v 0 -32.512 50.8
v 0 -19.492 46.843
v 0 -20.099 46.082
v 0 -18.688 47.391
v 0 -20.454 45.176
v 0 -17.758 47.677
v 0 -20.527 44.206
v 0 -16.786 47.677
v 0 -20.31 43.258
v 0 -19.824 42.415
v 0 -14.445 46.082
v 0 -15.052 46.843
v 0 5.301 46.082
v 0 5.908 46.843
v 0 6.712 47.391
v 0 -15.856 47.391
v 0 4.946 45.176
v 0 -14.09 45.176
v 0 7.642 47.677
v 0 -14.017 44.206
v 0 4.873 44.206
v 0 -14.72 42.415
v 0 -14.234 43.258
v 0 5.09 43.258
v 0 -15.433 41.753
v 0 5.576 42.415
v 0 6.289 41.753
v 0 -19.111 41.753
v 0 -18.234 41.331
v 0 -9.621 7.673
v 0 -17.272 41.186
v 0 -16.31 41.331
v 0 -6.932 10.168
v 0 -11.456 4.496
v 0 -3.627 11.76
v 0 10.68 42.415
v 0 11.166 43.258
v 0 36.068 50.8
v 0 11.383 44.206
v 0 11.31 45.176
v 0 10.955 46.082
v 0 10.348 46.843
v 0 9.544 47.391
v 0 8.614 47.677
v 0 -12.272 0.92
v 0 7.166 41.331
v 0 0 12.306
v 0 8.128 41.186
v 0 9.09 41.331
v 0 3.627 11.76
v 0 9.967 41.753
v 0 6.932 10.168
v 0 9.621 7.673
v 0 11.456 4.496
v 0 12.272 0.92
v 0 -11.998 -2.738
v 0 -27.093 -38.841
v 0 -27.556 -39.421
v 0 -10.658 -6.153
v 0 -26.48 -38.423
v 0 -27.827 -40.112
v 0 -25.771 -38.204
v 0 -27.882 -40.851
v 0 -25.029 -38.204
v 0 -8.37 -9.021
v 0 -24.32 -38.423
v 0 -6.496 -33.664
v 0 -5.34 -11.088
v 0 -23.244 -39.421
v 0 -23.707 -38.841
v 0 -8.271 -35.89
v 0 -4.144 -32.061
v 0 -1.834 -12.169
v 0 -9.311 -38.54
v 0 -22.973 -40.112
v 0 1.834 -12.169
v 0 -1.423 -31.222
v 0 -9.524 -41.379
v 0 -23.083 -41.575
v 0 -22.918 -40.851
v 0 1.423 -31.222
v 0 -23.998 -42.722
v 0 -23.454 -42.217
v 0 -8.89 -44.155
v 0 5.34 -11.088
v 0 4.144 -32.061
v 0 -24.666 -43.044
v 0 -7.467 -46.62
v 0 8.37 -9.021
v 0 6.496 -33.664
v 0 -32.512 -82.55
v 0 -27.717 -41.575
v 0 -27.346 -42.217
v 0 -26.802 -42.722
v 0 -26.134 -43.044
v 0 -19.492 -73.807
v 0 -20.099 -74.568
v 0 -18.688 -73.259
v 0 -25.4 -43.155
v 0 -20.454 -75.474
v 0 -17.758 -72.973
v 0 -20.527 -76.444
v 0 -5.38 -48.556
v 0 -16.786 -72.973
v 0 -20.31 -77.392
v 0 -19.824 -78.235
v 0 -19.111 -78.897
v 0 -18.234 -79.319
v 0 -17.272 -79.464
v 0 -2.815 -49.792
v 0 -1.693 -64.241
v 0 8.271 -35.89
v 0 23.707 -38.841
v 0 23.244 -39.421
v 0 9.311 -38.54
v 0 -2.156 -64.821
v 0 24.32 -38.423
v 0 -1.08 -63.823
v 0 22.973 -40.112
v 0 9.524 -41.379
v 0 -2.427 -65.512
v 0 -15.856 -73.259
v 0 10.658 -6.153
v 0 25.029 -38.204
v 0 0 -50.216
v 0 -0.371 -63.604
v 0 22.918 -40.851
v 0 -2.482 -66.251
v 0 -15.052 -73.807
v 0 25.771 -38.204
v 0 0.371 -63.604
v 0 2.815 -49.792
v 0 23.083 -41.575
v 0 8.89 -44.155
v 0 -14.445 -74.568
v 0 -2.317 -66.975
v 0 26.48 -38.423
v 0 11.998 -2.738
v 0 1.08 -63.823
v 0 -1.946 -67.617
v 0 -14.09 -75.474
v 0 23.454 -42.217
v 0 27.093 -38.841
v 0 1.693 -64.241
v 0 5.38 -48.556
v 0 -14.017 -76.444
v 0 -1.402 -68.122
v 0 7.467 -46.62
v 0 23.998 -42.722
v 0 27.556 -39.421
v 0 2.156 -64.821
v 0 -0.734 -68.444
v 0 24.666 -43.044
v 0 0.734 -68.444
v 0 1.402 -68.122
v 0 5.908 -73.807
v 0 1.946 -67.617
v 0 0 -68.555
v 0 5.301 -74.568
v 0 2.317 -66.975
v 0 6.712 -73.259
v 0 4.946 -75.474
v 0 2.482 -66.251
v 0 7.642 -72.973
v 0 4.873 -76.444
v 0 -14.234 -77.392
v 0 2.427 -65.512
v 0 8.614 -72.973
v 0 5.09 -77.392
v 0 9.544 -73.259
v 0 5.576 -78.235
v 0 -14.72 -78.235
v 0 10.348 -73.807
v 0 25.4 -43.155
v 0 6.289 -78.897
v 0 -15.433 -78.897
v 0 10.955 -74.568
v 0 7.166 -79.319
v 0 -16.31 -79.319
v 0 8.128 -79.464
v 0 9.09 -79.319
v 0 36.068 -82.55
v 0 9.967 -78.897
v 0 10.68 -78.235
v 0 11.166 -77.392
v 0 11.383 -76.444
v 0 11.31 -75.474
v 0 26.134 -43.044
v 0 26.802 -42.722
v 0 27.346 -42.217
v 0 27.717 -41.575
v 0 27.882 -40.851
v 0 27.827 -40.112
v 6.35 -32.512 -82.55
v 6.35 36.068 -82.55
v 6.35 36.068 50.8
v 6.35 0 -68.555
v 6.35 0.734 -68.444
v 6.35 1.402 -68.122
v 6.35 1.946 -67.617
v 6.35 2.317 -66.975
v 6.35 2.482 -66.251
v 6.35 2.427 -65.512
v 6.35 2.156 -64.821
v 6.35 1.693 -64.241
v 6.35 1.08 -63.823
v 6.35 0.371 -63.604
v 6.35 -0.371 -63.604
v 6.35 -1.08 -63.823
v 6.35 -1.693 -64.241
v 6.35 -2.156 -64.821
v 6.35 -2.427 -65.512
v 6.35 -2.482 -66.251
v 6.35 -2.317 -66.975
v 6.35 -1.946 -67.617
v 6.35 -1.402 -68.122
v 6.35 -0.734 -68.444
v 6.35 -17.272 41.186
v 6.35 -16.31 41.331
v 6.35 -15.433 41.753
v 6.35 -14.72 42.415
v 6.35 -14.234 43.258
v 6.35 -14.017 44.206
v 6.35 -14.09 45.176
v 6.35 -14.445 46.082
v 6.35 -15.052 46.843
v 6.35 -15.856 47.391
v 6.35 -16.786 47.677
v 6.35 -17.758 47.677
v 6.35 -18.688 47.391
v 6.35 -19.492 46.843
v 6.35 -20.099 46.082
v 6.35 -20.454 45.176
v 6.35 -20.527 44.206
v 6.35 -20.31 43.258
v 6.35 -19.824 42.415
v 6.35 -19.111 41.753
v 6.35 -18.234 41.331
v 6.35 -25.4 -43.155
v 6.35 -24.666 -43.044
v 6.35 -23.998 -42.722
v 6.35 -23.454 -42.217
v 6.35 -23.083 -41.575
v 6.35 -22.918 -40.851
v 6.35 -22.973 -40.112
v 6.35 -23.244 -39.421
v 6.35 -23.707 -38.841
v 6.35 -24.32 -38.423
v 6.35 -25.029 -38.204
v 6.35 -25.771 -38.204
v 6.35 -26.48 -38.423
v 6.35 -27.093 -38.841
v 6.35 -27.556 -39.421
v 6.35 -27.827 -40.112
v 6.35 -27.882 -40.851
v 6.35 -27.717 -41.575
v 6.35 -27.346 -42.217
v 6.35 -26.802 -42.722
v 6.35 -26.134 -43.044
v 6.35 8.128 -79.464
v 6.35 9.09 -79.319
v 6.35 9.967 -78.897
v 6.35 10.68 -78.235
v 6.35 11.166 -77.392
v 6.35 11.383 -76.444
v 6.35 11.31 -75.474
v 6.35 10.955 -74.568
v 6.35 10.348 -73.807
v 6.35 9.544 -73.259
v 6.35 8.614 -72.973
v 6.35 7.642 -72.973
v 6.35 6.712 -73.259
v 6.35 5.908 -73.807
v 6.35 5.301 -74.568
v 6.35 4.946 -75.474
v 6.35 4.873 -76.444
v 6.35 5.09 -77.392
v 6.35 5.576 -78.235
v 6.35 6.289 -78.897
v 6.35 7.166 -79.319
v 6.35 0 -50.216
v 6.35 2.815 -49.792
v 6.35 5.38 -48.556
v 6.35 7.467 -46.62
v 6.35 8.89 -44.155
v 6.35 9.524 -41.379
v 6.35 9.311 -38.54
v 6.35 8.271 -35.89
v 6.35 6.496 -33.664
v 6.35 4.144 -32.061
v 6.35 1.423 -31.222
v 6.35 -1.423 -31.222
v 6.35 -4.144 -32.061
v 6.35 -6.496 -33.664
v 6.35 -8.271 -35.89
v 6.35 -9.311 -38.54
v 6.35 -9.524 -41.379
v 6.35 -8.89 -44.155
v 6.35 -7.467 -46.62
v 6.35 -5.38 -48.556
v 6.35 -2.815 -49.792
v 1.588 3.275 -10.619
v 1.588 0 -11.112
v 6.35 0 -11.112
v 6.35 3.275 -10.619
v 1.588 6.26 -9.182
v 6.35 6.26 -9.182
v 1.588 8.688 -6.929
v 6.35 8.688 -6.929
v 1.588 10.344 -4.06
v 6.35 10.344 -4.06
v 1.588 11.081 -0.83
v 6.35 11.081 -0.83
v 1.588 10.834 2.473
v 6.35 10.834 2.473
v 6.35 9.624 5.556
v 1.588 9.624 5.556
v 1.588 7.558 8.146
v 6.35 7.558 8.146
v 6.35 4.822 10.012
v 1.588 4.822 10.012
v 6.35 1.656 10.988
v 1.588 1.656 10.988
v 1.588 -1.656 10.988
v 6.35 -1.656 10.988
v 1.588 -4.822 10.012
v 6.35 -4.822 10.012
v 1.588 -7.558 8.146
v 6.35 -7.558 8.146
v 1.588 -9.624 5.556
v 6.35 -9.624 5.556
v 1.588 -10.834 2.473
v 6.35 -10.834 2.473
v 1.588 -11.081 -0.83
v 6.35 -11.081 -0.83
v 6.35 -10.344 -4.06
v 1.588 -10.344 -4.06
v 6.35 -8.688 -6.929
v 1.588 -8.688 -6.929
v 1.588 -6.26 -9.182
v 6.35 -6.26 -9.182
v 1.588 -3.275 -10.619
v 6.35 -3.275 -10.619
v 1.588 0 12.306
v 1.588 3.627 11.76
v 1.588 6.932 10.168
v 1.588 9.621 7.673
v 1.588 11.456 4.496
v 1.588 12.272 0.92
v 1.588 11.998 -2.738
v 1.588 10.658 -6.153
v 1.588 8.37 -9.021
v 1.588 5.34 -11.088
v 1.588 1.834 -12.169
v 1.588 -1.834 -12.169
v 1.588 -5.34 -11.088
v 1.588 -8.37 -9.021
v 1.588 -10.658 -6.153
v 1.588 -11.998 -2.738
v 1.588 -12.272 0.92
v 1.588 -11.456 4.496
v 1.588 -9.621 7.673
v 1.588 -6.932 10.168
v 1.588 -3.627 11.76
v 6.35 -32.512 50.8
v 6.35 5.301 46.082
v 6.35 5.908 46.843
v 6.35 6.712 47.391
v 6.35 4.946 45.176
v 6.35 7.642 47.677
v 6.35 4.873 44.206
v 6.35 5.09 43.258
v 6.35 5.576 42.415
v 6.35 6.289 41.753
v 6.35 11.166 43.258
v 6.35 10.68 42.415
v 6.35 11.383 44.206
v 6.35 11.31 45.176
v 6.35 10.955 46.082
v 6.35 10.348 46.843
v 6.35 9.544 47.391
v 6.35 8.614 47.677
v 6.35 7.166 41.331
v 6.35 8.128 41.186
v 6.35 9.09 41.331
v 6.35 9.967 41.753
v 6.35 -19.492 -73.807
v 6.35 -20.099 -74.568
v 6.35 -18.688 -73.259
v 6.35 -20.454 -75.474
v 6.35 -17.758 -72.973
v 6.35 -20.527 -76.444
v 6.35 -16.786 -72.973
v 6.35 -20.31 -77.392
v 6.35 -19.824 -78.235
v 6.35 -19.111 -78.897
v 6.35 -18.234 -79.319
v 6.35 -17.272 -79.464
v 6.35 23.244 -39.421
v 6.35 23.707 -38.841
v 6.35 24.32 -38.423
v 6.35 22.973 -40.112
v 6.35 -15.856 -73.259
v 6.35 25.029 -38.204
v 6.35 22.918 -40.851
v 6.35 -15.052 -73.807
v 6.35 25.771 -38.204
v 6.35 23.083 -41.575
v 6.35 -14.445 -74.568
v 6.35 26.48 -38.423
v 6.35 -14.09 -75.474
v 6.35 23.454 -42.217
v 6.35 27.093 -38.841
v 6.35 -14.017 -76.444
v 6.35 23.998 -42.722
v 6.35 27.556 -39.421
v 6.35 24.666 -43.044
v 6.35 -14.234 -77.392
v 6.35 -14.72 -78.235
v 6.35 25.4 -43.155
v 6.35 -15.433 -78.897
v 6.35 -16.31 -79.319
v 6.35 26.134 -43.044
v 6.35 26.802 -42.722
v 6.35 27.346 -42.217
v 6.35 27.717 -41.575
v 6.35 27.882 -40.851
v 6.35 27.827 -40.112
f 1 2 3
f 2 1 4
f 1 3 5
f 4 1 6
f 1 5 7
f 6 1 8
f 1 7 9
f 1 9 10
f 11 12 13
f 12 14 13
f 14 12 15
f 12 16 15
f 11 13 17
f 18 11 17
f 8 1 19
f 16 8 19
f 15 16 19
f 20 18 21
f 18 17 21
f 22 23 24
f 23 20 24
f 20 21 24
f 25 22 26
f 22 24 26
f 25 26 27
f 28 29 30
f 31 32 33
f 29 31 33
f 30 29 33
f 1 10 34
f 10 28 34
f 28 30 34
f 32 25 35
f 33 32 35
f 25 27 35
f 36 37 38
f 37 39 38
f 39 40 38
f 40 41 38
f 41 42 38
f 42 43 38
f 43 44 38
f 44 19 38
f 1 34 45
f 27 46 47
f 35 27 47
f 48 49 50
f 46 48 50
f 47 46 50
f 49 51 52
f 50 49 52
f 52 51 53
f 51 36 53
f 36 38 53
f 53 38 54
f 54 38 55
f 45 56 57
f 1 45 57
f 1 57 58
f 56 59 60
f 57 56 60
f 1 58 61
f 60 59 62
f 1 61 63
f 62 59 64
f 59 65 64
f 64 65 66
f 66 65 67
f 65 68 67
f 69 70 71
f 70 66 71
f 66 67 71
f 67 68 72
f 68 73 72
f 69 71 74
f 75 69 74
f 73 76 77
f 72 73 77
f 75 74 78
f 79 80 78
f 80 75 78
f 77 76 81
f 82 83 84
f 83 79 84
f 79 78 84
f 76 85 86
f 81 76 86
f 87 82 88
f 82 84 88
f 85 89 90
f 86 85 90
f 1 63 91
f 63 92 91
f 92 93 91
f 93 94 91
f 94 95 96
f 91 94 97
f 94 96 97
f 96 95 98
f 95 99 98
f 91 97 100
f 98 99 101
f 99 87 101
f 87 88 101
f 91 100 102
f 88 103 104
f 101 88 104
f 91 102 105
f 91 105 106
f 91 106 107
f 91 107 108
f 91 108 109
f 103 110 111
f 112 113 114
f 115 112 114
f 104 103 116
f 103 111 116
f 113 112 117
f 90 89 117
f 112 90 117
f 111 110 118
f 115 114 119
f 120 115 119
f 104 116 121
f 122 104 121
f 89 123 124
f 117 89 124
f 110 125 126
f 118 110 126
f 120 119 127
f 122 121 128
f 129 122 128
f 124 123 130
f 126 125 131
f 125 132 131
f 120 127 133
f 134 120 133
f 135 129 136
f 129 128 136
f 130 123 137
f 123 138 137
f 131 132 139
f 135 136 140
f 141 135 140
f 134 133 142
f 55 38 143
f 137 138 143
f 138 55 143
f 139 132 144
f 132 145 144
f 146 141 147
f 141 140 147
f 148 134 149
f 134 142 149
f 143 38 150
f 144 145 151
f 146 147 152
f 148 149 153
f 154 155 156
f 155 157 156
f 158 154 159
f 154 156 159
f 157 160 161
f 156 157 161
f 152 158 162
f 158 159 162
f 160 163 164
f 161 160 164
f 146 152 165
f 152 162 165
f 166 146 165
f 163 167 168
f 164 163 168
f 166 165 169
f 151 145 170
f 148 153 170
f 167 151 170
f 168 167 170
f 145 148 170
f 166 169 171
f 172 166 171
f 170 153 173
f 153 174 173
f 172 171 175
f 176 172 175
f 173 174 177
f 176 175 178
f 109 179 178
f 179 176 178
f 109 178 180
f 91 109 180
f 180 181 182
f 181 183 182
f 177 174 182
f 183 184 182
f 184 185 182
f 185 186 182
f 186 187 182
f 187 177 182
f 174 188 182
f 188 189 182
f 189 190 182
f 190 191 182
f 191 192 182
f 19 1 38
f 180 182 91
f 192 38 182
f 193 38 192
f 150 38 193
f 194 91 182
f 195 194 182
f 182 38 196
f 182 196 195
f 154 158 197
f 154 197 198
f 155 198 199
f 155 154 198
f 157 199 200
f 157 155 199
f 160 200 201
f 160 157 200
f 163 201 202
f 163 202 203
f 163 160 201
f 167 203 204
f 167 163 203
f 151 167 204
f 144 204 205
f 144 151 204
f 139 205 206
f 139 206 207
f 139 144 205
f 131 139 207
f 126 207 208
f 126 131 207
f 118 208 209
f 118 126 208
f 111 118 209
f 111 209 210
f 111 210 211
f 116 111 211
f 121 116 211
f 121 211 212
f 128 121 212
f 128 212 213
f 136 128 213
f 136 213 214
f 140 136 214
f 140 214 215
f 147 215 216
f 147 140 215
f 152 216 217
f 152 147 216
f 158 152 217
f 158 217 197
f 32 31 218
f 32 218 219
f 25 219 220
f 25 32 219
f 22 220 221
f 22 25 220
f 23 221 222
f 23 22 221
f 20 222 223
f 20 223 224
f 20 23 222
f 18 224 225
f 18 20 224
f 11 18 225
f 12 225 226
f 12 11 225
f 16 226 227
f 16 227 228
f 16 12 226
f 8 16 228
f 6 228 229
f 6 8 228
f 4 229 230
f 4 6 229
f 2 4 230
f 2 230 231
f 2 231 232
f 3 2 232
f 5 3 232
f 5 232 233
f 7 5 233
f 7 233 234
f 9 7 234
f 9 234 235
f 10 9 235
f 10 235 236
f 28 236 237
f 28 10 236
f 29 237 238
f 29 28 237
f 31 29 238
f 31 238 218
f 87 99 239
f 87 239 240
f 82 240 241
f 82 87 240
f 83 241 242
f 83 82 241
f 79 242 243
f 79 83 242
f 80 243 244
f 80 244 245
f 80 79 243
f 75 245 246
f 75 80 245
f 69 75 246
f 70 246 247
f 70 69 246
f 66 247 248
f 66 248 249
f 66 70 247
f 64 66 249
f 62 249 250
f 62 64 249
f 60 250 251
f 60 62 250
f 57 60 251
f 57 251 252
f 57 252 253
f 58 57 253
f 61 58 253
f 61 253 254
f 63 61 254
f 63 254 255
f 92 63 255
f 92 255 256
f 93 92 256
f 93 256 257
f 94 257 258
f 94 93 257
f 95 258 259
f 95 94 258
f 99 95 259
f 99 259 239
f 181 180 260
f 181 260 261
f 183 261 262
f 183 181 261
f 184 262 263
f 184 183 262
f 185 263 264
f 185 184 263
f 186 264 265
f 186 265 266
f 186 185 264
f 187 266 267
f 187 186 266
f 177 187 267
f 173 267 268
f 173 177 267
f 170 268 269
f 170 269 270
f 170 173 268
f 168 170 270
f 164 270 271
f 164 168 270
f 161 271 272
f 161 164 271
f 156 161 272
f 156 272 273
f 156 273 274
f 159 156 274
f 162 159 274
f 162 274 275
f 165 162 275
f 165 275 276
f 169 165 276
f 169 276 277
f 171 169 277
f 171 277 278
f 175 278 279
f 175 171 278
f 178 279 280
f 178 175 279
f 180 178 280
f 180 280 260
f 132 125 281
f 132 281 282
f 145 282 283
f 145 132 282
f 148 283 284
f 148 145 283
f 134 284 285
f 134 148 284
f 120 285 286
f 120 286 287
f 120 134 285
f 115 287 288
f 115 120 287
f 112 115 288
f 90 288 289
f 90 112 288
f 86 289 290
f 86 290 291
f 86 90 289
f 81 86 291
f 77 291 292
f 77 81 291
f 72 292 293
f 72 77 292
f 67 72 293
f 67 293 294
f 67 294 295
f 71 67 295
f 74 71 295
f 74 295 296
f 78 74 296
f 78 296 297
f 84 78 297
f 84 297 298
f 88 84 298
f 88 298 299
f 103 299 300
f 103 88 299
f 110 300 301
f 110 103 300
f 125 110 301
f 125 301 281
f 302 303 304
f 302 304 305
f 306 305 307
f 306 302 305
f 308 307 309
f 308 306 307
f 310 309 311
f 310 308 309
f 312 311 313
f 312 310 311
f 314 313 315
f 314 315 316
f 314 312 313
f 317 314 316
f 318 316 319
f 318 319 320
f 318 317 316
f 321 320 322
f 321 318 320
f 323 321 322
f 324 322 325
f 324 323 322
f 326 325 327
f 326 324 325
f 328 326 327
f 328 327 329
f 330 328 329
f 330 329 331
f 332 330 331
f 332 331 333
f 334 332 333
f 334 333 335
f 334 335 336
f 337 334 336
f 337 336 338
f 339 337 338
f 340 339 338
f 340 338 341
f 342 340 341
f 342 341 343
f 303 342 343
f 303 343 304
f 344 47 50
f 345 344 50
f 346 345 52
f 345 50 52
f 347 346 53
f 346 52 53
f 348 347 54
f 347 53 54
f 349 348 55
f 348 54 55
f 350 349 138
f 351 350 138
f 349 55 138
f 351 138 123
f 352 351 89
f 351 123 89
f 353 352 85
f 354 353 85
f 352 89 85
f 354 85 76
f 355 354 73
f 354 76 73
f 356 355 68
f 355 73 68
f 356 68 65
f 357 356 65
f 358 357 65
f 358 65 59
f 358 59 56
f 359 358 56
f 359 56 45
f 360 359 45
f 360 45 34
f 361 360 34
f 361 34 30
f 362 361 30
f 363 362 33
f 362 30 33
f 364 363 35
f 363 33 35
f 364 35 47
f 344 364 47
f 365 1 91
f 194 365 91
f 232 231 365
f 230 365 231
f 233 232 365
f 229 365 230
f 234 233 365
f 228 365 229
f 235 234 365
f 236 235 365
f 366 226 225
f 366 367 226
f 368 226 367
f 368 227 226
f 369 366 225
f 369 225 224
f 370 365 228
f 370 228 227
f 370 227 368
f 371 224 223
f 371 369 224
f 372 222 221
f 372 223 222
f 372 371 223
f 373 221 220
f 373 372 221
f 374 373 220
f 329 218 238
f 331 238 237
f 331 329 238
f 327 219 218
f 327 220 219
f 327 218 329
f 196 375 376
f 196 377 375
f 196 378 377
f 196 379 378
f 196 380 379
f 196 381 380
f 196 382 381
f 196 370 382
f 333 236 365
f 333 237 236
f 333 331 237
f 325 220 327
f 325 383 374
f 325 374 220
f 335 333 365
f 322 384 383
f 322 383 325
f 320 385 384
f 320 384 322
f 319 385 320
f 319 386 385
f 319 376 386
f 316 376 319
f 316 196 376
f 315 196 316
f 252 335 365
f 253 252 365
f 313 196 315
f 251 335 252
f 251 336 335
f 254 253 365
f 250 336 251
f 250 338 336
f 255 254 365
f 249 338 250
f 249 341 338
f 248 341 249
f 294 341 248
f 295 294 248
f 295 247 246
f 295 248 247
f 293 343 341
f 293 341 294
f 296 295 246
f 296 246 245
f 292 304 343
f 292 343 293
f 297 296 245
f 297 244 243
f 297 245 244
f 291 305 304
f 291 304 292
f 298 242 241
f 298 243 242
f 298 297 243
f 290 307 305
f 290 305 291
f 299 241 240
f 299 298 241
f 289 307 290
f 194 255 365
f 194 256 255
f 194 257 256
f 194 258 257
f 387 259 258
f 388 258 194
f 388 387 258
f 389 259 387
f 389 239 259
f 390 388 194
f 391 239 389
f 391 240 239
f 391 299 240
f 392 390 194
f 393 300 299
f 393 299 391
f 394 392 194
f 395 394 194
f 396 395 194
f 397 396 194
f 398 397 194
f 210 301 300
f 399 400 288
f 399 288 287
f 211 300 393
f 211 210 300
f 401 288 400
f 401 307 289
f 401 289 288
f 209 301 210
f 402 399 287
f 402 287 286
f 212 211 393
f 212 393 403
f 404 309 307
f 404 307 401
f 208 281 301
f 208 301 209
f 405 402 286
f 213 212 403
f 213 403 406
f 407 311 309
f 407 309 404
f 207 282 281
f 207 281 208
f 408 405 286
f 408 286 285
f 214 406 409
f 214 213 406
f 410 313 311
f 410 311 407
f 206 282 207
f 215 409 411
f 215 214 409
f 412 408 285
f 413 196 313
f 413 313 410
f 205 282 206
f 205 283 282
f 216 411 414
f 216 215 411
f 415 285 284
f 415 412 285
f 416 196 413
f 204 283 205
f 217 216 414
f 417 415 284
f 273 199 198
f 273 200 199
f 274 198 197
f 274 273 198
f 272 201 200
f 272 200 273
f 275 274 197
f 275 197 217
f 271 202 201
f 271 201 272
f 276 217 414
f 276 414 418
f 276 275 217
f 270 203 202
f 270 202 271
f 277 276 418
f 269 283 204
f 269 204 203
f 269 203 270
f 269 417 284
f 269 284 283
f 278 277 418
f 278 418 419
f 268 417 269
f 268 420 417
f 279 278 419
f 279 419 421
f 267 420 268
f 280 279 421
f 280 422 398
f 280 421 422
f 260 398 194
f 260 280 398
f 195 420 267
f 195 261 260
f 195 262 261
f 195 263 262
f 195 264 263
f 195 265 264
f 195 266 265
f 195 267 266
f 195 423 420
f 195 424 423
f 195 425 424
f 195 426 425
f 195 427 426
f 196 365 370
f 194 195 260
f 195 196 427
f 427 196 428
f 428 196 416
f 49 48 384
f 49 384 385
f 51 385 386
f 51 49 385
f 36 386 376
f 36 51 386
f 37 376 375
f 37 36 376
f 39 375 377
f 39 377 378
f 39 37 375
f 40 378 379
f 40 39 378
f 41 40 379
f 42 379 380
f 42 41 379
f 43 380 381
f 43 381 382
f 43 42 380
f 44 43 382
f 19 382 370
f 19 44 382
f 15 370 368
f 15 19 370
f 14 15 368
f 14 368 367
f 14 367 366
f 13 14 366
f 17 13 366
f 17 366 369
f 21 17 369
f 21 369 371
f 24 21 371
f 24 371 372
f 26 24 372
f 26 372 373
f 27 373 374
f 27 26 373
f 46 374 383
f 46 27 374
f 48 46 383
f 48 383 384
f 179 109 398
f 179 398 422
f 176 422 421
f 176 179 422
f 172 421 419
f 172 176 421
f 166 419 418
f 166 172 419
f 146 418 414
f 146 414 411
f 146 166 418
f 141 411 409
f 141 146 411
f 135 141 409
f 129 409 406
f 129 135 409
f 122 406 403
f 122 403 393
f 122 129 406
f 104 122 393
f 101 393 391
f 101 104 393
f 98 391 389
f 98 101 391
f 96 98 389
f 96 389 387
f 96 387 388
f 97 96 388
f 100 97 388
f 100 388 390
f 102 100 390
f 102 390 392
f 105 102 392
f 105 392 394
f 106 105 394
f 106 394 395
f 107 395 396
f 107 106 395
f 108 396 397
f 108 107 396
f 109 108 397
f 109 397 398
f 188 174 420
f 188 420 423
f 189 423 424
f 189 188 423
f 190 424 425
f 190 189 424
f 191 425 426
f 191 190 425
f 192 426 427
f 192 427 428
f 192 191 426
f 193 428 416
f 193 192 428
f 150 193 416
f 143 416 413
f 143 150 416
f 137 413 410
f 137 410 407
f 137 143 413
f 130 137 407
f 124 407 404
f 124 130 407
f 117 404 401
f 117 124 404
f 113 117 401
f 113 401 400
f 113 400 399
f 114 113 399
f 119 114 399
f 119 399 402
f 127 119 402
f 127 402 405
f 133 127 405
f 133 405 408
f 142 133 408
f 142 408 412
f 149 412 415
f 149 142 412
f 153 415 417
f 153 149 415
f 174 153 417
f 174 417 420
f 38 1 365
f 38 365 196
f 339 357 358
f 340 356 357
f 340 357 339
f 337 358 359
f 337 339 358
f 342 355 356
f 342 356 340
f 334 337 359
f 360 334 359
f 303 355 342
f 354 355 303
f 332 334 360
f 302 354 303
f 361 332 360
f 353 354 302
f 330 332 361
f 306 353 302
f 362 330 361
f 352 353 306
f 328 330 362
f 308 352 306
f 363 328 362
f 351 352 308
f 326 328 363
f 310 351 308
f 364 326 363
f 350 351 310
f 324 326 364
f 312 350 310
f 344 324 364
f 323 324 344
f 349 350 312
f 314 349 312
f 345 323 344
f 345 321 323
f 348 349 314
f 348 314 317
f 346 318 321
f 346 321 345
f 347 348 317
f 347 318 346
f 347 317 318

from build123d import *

# Parameters (mm, degrees)
SKETCH1_W           = 133.35
SKETCH1_H           = 68.58
SKETCH1_R           = 11.1125
SKETCH1_R_2         = 9.5504
SKETCH1_R_3         = 2.4892
SKETCH1_R_4         = 3.2639
BOSS_EXTRUDE1_DEPTH = 6.35
SKETCH2_R           = 12.3063
CUT_EXTRUDE1_DEPTH  = 1.5875


with BuildPart() as part:
    # Sketch1 → Boss-Extrude1 (new body)
    with BuildSketch(Plane(origin=(0, 0, 0), x_dir=(0, 0, -1), z_dir=(1, 0, 0))):
        with Locations((15.875, 1.778)):
            Rectangle(SKETCH1_W, SKETCH1_H)
        Circle(SKETCH1_R, mode=Mode.SUBTRACT)
        with Locations((40.6654, 0)):
            Circle(SKETCH1_R_2, mode=Mode.SUBTRACT)
        with Locations((40.6654, 25.4)):
            Circle(SKETCH1_R_3, mode=Mode.SUBTRACT)
        with Locations((40.6654, -25.4)):
            Circle(SKETCH1_R_3, mode=Mode.SUBTRACT)
        with Locations((66.0654, 0)):
            Circle(SKETCH1_R_3, mode=Mode.SUBTRACT)
        with Locations((76.2, -17.272)):
            Circle(SKETCH1_R_4, mode=Mode.SUBTRACT)
        with Locations((76.2, 8.128)):
            Circle(SKETCH1_R_4, mode=Mode.SUBTRACT)
        with Locations((-44.45, 8.128)):
            Circle(SKETCH1_R_4, mode=Mode.SUBTRACT)
        with Locations((-44.45, -17.272)):
            Circle(SKETCH1_R_4, mode=Mode.SUBTRACT)
    extrude(amount=BOSS_EXTRUDE1_DEPTH)

    # Sketch2 → Cut-Extrude1 (cut)
    with BuildSketch(Plane.ZY):
        Circle(SKETCH2_R)
    extrude(amount=-CUT_EXTRUDE1_DEPTH, mode=Mode.SUBTRACT)


solid = part.part
